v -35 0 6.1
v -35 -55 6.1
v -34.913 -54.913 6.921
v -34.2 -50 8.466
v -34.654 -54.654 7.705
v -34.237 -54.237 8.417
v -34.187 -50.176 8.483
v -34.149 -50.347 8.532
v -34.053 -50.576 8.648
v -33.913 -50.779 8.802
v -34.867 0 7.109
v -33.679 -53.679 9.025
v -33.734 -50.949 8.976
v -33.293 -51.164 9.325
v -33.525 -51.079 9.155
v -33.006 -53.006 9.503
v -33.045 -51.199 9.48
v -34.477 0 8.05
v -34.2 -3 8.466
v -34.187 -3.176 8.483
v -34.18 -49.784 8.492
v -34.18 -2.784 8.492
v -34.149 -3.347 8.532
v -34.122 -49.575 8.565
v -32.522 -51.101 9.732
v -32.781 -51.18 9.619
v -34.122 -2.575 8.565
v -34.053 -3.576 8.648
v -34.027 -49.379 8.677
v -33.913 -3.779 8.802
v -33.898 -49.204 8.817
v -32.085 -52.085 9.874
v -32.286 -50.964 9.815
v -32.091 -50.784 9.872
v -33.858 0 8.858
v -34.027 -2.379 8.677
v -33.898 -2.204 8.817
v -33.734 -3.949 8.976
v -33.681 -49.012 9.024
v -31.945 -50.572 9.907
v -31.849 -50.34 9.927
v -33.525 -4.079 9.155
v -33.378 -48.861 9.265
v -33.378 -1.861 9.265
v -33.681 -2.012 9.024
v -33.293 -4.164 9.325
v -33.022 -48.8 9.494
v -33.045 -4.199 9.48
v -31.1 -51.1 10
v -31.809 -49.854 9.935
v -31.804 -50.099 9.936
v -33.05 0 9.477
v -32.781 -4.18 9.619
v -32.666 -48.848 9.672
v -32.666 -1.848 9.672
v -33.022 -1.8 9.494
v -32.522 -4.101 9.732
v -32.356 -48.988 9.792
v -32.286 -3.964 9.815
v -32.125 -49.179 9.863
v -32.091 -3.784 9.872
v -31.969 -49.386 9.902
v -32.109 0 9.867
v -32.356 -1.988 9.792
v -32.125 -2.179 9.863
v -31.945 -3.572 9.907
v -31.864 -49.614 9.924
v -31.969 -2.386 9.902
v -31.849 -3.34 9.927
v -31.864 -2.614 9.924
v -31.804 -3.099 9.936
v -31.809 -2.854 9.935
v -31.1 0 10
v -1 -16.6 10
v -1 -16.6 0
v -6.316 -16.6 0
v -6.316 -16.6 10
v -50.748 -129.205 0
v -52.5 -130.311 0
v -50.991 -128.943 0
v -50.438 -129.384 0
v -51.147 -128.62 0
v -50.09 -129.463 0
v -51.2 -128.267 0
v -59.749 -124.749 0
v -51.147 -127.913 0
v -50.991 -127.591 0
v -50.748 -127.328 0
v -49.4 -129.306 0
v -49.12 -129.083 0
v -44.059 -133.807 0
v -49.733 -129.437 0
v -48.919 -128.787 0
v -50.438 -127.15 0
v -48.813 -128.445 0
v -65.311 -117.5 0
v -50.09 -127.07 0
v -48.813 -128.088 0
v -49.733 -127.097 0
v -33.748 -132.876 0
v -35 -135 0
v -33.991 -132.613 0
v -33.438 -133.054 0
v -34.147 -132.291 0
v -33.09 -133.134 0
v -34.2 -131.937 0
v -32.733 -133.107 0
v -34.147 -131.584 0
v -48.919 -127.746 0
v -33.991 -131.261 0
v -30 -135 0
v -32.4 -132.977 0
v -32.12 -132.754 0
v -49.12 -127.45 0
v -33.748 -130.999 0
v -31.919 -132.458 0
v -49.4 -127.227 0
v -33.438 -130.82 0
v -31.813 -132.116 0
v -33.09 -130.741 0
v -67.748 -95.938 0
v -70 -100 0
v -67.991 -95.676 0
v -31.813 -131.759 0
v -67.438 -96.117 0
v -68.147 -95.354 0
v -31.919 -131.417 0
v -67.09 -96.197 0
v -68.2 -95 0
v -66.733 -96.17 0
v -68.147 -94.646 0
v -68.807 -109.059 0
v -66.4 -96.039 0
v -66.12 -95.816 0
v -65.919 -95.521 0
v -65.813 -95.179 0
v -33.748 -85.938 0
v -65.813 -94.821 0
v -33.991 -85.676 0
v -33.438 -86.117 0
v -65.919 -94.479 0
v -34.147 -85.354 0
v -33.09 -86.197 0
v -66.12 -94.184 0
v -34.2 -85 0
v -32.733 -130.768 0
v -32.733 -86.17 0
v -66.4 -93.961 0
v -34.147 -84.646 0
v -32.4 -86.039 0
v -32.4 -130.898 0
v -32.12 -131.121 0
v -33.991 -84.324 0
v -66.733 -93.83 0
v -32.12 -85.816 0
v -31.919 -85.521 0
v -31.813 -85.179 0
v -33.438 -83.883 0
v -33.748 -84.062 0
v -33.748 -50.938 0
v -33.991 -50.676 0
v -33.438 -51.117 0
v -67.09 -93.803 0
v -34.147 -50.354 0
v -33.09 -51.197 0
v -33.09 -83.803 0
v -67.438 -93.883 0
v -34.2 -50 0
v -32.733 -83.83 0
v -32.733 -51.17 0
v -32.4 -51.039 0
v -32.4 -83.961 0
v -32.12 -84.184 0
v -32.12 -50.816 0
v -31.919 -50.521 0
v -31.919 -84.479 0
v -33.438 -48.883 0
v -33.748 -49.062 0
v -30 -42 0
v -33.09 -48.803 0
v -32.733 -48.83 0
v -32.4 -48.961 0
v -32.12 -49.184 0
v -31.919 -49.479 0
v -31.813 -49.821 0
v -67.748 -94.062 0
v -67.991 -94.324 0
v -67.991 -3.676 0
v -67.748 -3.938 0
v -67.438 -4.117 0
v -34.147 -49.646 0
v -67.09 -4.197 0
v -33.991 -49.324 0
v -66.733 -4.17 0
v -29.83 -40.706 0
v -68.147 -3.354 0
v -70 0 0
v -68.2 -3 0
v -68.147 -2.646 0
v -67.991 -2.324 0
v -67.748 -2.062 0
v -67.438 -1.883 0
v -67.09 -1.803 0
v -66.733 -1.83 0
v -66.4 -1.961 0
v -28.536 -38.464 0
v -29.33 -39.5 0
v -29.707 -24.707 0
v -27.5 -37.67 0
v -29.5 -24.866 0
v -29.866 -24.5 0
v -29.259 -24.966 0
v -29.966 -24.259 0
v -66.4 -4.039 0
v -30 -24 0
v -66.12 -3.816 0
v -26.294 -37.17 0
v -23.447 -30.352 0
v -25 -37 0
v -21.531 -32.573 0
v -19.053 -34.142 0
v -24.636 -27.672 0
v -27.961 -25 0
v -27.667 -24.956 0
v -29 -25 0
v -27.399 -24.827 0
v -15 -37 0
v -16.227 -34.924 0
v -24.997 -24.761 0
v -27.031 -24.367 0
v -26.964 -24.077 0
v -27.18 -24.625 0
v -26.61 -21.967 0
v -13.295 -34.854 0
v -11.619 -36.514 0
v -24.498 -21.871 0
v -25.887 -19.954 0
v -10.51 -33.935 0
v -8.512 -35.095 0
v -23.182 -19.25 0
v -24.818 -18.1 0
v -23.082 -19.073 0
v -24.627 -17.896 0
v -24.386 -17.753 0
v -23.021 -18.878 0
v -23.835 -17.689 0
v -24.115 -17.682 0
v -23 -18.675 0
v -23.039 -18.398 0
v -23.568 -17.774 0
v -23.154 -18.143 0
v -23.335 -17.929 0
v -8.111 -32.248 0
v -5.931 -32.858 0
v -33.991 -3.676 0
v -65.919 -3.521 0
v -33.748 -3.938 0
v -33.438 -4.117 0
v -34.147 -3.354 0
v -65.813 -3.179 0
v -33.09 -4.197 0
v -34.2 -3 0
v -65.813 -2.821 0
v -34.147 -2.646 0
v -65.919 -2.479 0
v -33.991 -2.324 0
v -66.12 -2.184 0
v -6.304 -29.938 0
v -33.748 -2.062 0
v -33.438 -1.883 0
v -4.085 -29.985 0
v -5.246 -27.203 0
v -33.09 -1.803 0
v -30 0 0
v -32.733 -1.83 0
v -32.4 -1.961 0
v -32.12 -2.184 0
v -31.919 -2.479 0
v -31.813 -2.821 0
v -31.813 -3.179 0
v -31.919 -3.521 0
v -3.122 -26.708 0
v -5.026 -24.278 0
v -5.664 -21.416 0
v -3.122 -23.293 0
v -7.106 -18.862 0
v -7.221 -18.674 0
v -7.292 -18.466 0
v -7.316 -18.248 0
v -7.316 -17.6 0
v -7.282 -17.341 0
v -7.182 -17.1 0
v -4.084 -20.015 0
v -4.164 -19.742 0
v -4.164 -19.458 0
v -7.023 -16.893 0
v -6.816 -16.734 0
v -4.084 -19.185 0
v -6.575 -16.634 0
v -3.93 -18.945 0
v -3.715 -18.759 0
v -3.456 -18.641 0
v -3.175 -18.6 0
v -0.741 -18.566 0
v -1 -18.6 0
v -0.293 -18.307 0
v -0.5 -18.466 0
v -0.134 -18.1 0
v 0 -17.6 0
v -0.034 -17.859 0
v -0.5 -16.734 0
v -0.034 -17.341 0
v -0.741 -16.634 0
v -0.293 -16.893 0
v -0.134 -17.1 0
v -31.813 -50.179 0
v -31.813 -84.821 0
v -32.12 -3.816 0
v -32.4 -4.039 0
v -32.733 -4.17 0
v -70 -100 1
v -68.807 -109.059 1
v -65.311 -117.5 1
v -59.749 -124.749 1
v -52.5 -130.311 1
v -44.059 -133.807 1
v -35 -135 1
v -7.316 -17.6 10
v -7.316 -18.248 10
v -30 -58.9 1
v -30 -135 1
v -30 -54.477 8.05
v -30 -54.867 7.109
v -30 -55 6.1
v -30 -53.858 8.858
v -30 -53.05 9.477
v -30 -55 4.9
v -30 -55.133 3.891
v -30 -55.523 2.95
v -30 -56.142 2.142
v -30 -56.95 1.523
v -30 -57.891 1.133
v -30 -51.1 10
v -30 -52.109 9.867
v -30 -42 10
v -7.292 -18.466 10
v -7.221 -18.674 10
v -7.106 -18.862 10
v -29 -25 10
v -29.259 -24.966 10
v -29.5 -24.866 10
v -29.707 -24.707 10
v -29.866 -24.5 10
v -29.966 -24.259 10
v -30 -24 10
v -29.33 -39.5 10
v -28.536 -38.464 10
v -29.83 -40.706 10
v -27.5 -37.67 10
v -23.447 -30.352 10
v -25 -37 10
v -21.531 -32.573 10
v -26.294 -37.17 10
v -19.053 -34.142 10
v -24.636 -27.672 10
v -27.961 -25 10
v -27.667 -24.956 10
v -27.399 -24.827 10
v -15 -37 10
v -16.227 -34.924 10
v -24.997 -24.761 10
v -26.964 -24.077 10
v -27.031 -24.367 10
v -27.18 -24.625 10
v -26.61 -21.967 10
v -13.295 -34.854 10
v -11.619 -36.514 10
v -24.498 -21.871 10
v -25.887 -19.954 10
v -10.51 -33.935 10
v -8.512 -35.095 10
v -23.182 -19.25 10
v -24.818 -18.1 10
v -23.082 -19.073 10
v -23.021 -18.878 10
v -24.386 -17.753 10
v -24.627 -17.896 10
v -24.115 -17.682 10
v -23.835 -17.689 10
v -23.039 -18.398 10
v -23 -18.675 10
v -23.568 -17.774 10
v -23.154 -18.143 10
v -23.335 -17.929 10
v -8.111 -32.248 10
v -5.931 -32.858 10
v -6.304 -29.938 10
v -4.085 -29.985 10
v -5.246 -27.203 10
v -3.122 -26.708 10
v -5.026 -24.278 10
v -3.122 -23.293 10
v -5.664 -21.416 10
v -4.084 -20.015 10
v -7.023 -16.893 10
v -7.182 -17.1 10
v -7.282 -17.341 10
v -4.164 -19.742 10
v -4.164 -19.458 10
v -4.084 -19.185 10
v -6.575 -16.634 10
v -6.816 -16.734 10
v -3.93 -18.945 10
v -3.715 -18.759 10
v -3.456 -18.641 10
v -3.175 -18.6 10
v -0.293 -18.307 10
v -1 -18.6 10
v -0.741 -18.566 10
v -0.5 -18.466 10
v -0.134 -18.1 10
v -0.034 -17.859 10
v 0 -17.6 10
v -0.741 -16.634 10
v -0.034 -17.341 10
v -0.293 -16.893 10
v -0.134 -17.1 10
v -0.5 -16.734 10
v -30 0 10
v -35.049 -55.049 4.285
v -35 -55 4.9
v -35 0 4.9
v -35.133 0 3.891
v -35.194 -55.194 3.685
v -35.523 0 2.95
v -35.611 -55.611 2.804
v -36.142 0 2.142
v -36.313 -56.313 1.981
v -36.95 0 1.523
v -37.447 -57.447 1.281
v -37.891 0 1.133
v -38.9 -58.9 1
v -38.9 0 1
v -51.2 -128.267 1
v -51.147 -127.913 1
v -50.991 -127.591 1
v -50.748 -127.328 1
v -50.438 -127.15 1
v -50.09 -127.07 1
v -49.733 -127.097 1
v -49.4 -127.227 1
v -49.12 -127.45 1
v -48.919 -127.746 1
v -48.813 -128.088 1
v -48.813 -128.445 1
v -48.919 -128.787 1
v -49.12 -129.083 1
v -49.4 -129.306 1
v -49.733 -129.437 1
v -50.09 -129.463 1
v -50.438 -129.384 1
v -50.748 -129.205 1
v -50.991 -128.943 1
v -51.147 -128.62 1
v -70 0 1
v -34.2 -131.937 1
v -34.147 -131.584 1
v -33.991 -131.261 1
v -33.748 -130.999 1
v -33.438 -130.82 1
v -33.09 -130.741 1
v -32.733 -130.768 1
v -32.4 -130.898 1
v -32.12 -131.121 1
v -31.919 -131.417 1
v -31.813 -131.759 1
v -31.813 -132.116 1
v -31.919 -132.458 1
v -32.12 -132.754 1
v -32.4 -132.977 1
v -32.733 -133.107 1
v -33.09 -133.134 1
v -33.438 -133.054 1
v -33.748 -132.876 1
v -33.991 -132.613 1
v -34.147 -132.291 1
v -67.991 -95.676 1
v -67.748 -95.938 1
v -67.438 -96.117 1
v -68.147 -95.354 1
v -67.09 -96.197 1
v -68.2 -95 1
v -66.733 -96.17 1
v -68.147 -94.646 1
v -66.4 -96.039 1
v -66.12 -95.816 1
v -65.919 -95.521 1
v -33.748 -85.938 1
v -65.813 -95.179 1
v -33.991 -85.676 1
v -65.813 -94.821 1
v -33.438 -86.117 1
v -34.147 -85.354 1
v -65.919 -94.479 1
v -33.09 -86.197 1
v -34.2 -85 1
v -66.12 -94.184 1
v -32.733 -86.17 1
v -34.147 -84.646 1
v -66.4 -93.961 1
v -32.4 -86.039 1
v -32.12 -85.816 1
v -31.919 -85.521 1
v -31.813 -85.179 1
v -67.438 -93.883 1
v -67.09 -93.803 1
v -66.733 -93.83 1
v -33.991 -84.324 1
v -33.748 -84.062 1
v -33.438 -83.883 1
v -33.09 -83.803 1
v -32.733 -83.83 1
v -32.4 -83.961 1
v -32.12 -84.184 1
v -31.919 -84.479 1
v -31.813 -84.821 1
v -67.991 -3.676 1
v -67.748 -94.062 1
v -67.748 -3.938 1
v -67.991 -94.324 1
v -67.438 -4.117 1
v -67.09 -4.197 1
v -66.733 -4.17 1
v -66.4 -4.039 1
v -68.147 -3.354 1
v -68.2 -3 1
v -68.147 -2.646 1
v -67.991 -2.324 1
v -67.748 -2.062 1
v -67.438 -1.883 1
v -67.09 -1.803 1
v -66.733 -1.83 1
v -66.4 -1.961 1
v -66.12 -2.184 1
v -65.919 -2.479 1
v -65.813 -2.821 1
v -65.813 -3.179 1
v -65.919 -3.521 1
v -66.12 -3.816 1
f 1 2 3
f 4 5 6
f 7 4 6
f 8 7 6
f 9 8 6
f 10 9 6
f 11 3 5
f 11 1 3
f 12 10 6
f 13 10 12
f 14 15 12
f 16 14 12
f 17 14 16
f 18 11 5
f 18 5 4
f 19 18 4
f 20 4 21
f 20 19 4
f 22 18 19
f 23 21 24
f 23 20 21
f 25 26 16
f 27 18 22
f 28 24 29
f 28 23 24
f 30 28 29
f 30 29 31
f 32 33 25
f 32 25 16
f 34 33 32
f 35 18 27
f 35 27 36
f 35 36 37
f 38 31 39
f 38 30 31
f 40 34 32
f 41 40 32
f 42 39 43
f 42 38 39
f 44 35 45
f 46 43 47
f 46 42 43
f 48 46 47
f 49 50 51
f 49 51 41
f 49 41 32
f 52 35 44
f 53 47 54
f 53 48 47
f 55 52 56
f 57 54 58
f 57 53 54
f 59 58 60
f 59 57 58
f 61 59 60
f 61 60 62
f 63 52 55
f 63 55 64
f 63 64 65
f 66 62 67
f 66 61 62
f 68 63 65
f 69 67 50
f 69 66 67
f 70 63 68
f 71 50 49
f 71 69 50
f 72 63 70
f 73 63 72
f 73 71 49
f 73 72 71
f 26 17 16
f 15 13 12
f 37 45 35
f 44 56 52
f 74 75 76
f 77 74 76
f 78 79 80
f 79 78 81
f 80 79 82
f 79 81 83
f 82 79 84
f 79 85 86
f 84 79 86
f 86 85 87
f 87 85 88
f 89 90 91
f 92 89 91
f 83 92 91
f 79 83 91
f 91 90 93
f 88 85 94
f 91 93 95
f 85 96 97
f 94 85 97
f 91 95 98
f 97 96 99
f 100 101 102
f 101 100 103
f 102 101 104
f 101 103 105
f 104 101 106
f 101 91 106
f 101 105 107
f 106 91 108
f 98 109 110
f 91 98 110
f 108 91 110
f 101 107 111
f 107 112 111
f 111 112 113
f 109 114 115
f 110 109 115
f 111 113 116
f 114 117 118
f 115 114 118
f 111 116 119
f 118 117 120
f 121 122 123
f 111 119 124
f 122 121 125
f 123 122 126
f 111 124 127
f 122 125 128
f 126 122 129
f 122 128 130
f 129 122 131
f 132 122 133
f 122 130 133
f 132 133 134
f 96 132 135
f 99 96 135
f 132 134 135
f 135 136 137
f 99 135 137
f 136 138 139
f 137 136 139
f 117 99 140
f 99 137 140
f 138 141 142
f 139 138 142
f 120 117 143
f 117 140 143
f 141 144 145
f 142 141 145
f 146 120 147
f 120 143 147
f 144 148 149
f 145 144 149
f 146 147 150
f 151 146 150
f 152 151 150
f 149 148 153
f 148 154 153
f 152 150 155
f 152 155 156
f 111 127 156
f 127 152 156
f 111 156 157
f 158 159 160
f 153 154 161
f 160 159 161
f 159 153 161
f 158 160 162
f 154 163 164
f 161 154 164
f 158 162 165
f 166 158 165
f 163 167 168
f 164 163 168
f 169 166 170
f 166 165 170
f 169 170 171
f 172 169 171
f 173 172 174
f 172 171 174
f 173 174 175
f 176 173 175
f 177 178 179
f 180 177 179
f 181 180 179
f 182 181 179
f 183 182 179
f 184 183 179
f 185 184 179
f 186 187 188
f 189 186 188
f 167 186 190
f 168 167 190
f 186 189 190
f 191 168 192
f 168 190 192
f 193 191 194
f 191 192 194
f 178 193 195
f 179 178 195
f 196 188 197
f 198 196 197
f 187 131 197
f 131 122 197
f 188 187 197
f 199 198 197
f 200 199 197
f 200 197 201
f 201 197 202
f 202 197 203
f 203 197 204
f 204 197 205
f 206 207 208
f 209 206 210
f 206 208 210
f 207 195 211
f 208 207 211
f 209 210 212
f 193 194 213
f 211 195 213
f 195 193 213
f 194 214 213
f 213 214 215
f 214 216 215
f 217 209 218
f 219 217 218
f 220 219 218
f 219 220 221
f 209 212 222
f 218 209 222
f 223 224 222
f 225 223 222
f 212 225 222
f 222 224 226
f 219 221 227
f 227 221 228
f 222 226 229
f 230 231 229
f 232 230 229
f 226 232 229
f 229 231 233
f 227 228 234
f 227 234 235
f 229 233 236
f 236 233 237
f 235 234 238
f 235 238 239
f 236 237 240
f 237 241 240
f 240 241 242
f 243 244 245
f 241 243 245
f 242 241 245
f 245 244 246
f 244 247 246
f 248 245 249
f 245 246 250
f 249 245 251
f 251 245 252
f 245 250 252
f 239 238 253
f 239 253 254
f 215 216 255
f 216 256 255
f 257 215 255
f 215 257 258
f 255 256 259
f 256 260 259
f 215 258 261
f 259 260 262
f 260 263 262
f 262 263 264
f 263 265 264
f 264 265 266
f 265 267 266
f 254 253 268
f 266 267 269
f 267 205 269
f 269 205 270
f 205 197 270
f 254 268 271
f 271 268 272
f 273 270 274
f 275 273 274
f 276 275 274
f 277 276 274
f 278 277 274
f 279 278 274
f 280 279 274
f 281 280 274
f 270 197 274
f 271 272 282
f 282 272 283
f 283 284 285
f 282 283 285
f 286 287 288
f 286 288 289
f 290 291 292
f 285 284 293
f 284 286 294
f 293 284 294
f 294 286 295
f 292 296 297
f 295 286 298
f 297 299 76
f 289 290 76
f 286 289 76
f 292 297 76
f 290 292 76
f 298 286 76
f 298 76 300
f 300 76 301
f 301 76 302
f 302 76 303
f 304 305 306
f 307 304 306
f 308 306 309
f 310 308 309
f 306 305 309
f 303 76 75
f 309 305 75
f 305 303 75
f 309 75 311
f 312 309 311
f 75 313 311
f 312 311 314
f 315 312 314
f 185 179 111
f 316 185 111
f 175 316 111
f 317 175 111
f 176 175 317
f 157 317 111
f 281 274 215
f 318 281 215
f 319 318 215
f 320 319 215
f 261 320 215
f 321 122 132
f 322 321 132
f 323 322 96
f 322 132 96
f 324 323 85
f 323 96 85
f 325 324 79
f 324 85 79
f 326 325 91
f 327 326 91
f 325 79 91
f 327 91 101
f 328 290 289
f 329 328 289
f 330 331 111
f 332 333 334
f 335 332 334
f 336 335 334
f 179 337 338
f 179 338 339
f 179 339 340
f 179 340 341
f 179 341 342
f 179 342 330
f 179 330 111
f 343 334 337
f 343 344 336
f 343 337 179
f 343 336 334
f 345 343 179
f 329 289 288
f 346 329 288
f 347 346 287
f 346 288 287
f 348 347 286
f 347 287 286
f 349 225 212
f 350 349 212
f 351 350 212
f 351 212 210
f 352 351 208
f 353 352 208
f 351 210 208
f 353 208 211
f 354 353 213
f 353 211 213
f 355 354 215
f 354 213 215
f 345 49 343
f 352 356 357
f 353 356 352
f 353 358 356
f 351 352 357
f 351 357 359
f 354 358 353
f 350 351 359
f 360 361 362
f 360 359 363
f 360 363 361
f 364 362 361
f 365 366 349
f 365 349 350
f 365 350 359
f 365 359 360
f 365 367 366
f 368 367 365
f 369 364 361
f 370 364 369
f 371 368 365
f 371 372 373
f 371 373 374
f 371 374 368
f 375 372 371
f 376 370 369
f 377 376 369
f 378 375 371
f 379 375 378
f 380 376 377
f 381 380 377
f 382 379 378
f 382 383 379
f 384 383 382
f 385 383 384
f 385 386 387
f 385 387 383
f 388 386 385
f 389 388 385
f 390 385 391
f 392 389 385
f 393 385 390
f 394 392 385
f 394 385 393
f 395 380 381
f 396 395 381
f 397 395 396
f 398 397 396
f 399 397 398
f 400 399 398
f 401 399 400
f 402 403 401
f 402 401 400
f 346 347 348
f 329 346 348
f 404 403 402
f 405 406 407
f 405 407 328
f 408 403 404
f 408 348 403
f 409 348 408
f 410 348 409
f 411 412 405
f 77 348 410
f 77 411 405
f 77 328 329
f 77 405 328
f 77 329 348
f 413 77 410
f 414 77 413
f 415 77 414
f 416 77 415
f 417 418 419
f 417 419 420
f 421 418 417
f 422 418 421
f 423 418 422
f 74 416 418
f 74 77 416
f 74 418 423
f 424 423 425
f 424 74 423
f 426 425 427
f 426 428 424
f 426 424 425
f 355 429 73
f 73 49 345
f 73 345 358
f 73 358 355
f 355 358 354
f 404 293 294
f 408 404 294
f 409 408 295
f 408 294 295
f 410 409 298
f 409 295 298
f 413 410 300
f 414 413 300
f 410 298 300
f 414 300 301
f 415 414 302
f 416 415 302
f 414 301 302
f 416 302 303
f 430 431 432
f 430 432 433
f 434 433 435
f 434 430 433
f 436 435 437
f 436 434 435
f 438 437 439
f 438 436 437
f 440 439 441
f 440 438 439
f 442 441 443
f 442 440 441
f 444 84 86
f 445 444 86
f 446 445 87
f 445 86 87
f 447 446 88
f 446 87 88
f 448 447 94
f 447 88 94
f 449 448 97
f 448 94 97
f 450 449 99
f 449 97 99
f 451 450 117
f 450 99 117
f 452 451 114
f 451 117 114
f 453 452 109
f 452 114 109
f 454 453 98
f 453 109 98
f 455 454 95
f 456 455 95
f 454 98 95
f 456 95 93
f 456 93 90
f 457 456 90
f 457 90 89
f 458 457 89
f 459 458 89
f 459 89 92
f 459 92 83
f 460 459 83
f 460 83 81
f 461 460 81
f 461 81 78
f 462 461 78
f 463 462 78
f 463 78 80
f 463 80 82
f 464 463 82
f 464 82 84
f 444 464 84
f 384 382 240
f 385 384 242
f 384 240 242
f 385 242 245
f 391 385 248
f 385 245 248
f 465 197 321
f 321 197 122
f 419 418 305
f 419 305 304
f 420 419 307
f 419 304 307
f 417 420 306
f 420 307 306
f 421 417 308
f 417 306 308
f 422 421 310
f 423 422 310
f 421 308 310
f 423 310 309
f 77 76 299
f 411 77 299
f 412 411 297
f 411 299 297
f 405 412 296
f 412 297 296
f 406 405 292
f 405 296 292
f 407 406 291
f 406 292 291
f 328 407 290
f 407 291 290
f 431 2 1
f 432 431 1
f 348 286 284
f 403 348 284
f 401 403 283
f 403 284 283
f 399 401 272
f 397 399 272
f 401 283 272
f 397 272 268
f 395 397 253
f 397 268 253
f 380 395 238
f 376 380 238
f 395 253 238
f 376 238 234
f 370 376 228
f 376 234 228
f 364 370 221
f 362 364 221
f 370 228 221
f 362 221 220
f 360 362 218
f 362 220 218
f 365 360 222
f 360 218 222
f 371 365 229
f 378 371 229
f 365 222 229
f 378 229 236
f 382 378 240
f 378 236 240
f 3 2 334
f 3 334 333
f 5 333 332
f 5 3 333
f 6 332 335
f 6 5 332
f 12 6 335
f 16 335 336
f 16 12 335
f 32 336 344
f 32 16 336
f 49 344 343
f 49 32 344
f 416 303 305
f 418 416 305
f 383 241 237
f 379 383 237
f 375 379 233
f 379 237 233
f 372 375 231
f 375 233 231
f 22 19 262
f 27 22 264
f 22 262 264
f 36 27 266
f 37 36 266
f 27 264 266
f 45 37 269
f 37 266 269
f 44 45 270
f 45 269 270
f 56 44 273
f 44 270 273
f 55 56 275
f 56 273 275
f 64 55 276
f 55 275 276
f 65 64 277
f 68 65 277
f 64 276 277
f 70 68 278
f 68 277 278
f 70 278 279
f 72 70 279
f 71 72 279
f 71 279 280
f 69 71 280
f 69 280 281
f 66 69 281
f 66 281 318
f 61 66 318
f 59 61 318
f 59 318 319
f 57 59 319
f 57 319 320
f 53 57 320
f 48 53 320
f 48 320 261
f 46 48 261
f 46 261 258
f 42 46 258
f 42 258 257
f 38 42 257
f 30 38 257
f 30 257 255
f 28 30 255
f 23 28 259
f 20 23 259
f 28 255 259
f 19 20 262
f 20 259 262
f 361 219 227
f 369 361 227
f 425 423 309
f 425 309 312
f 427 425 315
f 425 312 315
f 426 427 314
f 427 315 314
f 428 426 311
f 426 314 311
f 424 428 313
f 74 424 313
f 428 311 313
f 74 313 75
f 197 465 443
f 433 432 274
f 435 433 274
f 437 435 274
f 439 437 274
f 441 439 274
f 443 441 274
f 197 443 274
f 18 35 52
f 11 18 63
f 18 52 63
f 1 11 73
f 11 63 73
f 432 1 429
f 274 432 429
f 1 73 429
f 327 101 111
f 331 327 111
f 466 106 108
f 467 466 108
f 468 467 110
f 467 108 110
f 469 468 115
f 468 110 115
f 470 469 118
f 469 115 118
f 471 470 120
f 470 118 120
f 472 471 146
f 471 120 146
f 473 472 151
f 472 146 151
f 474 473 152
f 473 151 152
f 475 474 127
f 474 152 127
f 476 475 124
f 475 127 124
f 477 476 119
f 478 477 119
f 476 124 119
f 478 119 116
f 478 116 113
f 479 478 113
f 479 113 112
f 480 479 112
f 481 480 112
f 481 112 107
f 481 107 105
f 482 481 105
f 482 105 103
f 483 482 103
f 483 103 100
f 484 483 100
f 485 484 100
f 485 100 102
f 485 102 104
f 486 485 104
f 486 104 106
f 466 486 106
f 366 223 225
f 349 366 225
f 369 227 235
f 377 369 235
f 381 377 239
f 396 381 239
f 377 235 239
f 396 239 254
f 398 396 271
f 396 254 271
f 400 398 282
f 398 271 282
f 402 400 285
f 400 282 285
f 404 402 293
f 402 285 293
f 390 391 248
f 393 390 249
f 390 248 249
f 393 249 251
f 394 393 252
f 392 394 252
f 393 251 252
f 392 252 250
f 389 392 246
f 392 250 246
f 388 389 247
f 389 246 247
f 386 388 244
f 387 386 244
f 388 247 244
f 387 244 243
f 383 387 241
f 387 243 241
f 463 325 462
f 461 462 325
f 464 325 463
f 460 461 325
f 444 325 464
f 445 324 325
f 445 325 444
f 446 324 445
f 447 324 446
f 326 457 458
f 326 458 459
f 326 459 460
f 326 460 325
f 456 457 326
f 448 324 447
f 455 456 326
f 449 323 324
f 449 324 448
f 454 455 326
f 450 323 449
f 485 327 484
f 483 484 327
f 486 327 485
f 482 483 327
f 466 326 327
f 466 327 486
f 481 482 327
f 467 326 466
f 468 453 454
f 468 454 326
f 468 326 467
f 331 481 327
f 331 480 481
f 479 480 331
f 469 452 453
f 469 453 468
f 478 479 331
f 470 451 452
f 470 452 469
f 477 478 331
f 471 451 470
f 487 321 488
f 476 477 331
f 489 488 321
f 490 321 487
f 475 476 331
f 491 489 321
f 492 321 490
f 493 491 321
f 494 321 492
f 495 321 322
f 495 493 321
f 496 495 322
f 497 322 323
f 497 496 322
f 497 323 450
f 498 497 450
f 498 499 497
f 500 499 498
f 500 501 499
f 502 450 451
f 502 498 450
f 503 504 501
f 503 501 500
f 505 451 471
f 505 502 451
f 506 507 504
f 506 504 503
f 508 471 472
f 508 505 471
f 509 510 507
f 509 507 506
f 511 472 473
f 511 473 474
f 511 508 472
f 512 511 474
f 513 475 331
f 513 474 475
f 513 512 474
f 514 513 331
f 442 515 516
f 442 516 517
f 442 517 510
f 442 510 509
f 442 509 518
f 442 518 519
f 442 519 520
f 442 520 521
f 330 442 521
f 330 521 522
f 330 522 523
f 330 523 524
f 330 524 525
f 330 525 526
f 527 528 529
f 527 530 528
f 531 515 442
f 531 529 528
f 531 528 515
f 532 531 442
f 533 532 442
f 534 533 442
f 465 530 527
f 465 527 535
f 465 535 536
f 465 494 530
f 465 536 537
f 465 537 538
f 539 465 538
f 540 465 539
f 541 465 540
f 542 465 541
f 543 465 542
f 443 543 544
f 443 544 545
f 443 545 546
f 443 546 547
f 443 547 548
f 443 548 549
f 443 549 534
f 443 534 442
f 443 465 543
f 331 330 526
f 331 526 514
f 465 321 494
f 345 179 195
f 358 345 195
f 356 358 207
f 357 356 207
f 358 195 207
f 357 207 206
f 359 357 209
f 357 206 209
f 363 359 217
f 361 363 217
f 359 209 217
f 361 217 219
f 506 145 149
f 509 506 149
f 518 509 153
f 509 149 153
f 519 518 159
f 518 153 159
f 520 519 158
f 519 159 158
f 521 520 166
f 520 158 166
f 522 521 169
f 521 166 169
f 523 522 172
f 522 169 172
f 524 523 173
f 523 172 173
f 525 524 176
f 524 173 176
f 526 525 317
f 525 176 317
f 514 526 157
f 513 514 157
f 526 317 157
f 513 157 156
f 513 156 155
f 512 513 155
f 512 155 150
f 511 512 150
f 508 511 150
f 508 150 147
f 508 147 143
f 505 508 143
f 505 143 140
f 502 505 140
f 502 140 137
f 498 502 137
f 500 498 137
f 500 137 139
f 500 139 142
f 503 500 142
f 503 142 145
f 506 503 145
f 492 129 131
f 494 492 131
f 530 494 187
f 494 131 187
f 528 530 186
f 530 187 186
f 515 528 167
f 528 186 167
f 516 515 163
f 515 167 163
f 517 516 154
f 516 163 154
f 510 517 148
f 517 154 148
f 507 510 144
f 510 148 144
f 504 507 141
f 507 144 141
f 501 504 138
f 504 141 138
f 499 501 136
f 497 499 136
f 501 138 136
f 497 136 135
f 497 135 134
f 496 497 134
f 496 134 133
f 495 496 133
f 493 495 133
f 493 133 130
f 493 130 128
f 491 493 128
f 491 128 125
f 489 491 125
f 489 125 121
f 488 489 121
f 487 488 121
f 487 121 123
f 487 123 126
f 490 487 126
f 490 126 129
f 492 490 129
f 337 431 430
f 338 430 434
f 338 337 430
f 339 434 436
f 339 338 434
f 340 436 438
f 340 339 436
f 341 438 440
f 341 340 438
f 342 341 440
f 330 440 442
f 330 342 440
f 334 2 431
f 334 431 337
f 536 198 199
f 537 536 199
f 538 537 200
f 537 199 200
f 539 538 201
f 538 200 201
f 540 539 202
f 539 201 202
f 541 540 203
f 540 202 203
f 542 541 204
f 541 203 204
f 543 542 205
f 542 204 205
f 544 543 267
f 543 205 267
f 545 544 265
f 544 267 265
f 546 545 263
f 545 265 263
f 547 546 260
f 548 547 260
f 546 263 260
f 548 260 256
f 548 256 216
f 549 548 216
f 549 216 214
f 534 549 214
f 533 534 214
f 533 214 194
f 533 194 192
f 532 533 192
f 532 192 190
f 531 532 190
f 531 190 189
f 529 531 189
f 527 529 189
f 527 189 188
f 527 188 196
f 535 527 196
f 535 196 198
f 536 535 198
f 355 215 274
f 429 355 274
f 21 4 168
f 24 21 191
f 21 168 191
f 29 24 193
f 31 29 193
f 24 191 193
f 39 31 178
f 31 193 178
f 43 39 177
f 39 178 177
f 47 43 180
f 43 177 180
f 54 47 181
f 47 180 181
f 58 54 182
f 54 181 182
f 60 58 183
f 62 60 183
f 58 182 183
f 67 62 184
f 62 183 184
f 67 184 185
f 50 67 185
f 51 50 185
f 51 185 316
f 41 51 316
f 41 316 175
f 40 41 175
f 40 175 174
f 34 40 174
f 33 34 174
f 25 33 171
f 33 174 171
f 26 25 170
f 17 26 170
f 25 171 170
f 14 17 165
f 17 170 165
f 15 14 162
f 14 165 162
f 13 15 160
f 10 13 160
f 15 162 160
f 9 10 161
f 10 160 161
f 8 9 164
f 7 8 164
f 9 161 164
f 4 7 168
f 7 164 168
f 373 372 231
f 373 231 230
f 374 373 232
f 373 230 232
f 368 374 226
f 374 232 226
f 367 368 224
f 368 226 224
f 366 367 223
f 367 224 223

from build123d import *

# Parameters (mm, degrees)
F1_DEPTH     = 10
F3_DEPTH     = 9
F5_D         = 2.4
F6_T1_DEPTH  = 55
F6_T3_DEPTH  = 5
F6_T9_DEPTH  = 64.75
F6_T13_DEPTH = 14.75
F6_T16_DEPTH = 24.5
F6_T18_DEPTH = 74.5


# Not quite as in the source:
# - a fillet or chamfer that OpenCascade refuses, or shapes differently, is made with other operations: its cross-section is extruded or revolved along the edge and cut away or added
# - a feature names something its author has since deleted; it is built from what else it names


with BuildPart() as f1:
    # F0 (on Top) → F1 (new body)
    with BuildSketch(Plane.XY):
        with BuildLine():
            Line((-30, 0), (-70, 0))
            Line((-70, 0), (-70, -100))
            ThreePointArc((-70, -100), (-59.7487373415, -124.7487373415), (-35, -135))
            Line((-35, -135), (-30, -135))
            Line((-30, -135), (-30, -42))
            ThreePointArc((-30, -42), (-28.5355339059, -38.4644660941), (-25, -37))
            Line((-25, -37), (-15, -37))
            ThreePointArc((-15, -37), (-4.9050660078, -31.4878584828), (-4.0842494776, -20.0153846154))
            ThreePointArc((-4.0842494776, -20.0153846154), (-4.0158481001, -19.0593451264), (-3.1746036007, -18.6))
            Line((-3.1746036007, -18.6), (-1, -18.6))
            ThreePointArc((-1, -18.6), (-0.2928932188, -18.3071067812), (0, -17.6))
            ThreePointArc((0, -17.6), (-0.2928932188, -16.8928932188), (-1, -16.6))
            Line((-1, -16.6), (-6.3162509151, -16.6))
            ThreePointArc((-6.3162509151, -16.6), (-7.0233576963, -16.8928932188), (-7.3162509151, -17.6))
            Line((-7.3162509151, -17.6), (-7.3162509151, -18.2477780079))
            ThreePointArc((-7.3162509151, -18.2477780079), (-7.2621451309, -18.5722531726), (-7.1056826501, -18.8616163708))
            ThreePointArc((-7.1056826501, -18.8616163708), (-14.7582290616, -34.9970769134), (-23.1818181818, -19.2504042542))
            ThreePointArc((-23.1818181818, -19.2504042542), (-23.0465374108, -18.9769560242), (-23, -18.6754446797))
            ThreePointArc((-23, -18.6754446797), (-23.6984886554, -17.7219820904), (-24.8181818182, -18.1004851051))
            ThreePointArc((-24.8181818182, -18.1004851051), (-26.2938104102, -20.9441589751), (-26.9644443663, -24.0769230769))
            ThreePointArc((-26.9644443663, -24.0769230769), (-27.2821151763, -24.7337993857), (-27.9614813968, -25))
            Line((-27.9614813968, -25), (-29, -25))
            ThreePointArc((-29, -25), (-29.7071067812, -24.7071067812), (-30, -24))
            Line((-30, -24), (-30, 0))
        make_face()
    extrude(amount=F1_DEPTH)

    # F2 (on face) → F3 (cut)
    with BuildSketch(Plane.XY.offset(10)):
        with BuildLine():
            Line((-35, -55), (-35, 0))
            Line((-35, 0), (-70, 0))
            Line((-70, 0), (-70, -100))
            ThreePointArc((-70, -100), (-59.7487373415, -124.7487373415), (-35, -135))
            Line((-35, -135), (-30, -135))
            Line((-30, -135), (-30, -55))
            Line((-30, -55), (-35, -55))
        make_face()
    extrude(amount=-F3_DEPTH, mode=Mode.SUBTRACT)

    # F5 (through all)
    with Locations(Plane.XY.offset(10)):
        with Locations((-67, -3), (-50, -128.2665880502), (-33, -131.9374388453), (-33, -85), (-33, -50), (-33, -3), (-67, -95)):
            Hole(F5_D / 2)

    # F6: fillet of radius 3.9 on 4 edges, made by hand

    # F6_s2 → F6_t1 (join)
    with BuildSketch(Plane.XZ):
        with BuildLine():
            ThreePointArc((-35, 4.9), (-36.1422835534, 2.1422835534), (-38.9, 1))
            Line((-38.9, 1), (-35, 1))
            Line((-35, 1), (-35, 4.9))
        make_face()
    extrude(amount=F6_T1_DEPTH)

    # F6_s4 → F6_t3 (join)
    with BuildSketch(Plane.YZ.offset(-35)):
        with BuildLine():
            ThreePointArc((-55, 4.9), (-56.1422835534, 2.1422835534), (-58.9, 1))
            Line((-58.9, 1), (-55, 1))
            Line((-55, 1), (-55, 4.9))
        make_face()
    extrude(amount=F6_T3_DEPTH)


with BuildPart() as f6_tool7:
    # F6_s8 → F6_t9 (new body)
    with BuildSketch(Plane.XZ.offset(64.75)):
        with BuildLine():
            ThreePointArc((-35, 4.9), (-36.1422835534, 2.1422835534), (-38.9, 1))
            Line((-38.9, 1), (-35, 1))
            Line((-35, 1), (-35, 4.9))
        make_face()
    extrude(amount=-F6_T9_DEPTH)

    split(bisect_by=Plane.XZ.offset(55), keep=Keep.TOP)


with BuildPart() as f6_tool11:
    # F6_s12 → F6_t13 (new body)
    with BuildSketch(Plane.YZ.offset(-30)):
        with BuildLine():
            ThreePointArc((-55, 4.9), (-56.1422835534, 2.1422835534), (-58.9, 1))
            Line((-58.9, 1), (-55, 1))
            Line((-55, 1), (-55, 4.9))
        make_face()
    extrude(amount=-F6_T13_DEPTH)

    split(bisect_by=Plane.YZ.offset(-35), keep=Keep.BOTTOM)


with BuildPart() as f6_tool7_1:
    add(f6_tool7.part)

    # F6_t15: intersect F6_tool11
    add(f6_tool11.part, mode=Mode.INTERSECT)


with BuildPart() as f1_1:
    add(f1.part)

    # F6_t5: union F6_tool7
    add(f6_tool7_1.part)

    # F6_s17 → F6_t16 (cut)
    with BuildSketch(Plane.YZ.offset(-44.75)):
        with BuildLine():
            ThreePointArc((-55, 6.1), (-53.8577164466, 8.8577164466), (-51.1, 10))
            Line((-51.1, 10), (-55, 10))
            Line((-55, 10), (-55, 6.1))
        make_face()
    extrude(amount=F6_T16_DEPTH, mode=Mode.SUBTRACT)

    # F6_s19 → F6_t18 (cut)
    with BuildSketch(Plane.XZ.offset(-9.75)):
        with BuildLine():
            ThreePointArc((-35, 6.1), (-33.8577164466, 8.8577164466), (-31.1, 10))
            Line((-31.1, 10), (-35, 10))
            Line((-35, 10), (-35, 6.1))
        make_face()
    extrude(amount=F6_T18_DEPTH, mode=Mode.SUBTRACT)


solid = f1_1.part
